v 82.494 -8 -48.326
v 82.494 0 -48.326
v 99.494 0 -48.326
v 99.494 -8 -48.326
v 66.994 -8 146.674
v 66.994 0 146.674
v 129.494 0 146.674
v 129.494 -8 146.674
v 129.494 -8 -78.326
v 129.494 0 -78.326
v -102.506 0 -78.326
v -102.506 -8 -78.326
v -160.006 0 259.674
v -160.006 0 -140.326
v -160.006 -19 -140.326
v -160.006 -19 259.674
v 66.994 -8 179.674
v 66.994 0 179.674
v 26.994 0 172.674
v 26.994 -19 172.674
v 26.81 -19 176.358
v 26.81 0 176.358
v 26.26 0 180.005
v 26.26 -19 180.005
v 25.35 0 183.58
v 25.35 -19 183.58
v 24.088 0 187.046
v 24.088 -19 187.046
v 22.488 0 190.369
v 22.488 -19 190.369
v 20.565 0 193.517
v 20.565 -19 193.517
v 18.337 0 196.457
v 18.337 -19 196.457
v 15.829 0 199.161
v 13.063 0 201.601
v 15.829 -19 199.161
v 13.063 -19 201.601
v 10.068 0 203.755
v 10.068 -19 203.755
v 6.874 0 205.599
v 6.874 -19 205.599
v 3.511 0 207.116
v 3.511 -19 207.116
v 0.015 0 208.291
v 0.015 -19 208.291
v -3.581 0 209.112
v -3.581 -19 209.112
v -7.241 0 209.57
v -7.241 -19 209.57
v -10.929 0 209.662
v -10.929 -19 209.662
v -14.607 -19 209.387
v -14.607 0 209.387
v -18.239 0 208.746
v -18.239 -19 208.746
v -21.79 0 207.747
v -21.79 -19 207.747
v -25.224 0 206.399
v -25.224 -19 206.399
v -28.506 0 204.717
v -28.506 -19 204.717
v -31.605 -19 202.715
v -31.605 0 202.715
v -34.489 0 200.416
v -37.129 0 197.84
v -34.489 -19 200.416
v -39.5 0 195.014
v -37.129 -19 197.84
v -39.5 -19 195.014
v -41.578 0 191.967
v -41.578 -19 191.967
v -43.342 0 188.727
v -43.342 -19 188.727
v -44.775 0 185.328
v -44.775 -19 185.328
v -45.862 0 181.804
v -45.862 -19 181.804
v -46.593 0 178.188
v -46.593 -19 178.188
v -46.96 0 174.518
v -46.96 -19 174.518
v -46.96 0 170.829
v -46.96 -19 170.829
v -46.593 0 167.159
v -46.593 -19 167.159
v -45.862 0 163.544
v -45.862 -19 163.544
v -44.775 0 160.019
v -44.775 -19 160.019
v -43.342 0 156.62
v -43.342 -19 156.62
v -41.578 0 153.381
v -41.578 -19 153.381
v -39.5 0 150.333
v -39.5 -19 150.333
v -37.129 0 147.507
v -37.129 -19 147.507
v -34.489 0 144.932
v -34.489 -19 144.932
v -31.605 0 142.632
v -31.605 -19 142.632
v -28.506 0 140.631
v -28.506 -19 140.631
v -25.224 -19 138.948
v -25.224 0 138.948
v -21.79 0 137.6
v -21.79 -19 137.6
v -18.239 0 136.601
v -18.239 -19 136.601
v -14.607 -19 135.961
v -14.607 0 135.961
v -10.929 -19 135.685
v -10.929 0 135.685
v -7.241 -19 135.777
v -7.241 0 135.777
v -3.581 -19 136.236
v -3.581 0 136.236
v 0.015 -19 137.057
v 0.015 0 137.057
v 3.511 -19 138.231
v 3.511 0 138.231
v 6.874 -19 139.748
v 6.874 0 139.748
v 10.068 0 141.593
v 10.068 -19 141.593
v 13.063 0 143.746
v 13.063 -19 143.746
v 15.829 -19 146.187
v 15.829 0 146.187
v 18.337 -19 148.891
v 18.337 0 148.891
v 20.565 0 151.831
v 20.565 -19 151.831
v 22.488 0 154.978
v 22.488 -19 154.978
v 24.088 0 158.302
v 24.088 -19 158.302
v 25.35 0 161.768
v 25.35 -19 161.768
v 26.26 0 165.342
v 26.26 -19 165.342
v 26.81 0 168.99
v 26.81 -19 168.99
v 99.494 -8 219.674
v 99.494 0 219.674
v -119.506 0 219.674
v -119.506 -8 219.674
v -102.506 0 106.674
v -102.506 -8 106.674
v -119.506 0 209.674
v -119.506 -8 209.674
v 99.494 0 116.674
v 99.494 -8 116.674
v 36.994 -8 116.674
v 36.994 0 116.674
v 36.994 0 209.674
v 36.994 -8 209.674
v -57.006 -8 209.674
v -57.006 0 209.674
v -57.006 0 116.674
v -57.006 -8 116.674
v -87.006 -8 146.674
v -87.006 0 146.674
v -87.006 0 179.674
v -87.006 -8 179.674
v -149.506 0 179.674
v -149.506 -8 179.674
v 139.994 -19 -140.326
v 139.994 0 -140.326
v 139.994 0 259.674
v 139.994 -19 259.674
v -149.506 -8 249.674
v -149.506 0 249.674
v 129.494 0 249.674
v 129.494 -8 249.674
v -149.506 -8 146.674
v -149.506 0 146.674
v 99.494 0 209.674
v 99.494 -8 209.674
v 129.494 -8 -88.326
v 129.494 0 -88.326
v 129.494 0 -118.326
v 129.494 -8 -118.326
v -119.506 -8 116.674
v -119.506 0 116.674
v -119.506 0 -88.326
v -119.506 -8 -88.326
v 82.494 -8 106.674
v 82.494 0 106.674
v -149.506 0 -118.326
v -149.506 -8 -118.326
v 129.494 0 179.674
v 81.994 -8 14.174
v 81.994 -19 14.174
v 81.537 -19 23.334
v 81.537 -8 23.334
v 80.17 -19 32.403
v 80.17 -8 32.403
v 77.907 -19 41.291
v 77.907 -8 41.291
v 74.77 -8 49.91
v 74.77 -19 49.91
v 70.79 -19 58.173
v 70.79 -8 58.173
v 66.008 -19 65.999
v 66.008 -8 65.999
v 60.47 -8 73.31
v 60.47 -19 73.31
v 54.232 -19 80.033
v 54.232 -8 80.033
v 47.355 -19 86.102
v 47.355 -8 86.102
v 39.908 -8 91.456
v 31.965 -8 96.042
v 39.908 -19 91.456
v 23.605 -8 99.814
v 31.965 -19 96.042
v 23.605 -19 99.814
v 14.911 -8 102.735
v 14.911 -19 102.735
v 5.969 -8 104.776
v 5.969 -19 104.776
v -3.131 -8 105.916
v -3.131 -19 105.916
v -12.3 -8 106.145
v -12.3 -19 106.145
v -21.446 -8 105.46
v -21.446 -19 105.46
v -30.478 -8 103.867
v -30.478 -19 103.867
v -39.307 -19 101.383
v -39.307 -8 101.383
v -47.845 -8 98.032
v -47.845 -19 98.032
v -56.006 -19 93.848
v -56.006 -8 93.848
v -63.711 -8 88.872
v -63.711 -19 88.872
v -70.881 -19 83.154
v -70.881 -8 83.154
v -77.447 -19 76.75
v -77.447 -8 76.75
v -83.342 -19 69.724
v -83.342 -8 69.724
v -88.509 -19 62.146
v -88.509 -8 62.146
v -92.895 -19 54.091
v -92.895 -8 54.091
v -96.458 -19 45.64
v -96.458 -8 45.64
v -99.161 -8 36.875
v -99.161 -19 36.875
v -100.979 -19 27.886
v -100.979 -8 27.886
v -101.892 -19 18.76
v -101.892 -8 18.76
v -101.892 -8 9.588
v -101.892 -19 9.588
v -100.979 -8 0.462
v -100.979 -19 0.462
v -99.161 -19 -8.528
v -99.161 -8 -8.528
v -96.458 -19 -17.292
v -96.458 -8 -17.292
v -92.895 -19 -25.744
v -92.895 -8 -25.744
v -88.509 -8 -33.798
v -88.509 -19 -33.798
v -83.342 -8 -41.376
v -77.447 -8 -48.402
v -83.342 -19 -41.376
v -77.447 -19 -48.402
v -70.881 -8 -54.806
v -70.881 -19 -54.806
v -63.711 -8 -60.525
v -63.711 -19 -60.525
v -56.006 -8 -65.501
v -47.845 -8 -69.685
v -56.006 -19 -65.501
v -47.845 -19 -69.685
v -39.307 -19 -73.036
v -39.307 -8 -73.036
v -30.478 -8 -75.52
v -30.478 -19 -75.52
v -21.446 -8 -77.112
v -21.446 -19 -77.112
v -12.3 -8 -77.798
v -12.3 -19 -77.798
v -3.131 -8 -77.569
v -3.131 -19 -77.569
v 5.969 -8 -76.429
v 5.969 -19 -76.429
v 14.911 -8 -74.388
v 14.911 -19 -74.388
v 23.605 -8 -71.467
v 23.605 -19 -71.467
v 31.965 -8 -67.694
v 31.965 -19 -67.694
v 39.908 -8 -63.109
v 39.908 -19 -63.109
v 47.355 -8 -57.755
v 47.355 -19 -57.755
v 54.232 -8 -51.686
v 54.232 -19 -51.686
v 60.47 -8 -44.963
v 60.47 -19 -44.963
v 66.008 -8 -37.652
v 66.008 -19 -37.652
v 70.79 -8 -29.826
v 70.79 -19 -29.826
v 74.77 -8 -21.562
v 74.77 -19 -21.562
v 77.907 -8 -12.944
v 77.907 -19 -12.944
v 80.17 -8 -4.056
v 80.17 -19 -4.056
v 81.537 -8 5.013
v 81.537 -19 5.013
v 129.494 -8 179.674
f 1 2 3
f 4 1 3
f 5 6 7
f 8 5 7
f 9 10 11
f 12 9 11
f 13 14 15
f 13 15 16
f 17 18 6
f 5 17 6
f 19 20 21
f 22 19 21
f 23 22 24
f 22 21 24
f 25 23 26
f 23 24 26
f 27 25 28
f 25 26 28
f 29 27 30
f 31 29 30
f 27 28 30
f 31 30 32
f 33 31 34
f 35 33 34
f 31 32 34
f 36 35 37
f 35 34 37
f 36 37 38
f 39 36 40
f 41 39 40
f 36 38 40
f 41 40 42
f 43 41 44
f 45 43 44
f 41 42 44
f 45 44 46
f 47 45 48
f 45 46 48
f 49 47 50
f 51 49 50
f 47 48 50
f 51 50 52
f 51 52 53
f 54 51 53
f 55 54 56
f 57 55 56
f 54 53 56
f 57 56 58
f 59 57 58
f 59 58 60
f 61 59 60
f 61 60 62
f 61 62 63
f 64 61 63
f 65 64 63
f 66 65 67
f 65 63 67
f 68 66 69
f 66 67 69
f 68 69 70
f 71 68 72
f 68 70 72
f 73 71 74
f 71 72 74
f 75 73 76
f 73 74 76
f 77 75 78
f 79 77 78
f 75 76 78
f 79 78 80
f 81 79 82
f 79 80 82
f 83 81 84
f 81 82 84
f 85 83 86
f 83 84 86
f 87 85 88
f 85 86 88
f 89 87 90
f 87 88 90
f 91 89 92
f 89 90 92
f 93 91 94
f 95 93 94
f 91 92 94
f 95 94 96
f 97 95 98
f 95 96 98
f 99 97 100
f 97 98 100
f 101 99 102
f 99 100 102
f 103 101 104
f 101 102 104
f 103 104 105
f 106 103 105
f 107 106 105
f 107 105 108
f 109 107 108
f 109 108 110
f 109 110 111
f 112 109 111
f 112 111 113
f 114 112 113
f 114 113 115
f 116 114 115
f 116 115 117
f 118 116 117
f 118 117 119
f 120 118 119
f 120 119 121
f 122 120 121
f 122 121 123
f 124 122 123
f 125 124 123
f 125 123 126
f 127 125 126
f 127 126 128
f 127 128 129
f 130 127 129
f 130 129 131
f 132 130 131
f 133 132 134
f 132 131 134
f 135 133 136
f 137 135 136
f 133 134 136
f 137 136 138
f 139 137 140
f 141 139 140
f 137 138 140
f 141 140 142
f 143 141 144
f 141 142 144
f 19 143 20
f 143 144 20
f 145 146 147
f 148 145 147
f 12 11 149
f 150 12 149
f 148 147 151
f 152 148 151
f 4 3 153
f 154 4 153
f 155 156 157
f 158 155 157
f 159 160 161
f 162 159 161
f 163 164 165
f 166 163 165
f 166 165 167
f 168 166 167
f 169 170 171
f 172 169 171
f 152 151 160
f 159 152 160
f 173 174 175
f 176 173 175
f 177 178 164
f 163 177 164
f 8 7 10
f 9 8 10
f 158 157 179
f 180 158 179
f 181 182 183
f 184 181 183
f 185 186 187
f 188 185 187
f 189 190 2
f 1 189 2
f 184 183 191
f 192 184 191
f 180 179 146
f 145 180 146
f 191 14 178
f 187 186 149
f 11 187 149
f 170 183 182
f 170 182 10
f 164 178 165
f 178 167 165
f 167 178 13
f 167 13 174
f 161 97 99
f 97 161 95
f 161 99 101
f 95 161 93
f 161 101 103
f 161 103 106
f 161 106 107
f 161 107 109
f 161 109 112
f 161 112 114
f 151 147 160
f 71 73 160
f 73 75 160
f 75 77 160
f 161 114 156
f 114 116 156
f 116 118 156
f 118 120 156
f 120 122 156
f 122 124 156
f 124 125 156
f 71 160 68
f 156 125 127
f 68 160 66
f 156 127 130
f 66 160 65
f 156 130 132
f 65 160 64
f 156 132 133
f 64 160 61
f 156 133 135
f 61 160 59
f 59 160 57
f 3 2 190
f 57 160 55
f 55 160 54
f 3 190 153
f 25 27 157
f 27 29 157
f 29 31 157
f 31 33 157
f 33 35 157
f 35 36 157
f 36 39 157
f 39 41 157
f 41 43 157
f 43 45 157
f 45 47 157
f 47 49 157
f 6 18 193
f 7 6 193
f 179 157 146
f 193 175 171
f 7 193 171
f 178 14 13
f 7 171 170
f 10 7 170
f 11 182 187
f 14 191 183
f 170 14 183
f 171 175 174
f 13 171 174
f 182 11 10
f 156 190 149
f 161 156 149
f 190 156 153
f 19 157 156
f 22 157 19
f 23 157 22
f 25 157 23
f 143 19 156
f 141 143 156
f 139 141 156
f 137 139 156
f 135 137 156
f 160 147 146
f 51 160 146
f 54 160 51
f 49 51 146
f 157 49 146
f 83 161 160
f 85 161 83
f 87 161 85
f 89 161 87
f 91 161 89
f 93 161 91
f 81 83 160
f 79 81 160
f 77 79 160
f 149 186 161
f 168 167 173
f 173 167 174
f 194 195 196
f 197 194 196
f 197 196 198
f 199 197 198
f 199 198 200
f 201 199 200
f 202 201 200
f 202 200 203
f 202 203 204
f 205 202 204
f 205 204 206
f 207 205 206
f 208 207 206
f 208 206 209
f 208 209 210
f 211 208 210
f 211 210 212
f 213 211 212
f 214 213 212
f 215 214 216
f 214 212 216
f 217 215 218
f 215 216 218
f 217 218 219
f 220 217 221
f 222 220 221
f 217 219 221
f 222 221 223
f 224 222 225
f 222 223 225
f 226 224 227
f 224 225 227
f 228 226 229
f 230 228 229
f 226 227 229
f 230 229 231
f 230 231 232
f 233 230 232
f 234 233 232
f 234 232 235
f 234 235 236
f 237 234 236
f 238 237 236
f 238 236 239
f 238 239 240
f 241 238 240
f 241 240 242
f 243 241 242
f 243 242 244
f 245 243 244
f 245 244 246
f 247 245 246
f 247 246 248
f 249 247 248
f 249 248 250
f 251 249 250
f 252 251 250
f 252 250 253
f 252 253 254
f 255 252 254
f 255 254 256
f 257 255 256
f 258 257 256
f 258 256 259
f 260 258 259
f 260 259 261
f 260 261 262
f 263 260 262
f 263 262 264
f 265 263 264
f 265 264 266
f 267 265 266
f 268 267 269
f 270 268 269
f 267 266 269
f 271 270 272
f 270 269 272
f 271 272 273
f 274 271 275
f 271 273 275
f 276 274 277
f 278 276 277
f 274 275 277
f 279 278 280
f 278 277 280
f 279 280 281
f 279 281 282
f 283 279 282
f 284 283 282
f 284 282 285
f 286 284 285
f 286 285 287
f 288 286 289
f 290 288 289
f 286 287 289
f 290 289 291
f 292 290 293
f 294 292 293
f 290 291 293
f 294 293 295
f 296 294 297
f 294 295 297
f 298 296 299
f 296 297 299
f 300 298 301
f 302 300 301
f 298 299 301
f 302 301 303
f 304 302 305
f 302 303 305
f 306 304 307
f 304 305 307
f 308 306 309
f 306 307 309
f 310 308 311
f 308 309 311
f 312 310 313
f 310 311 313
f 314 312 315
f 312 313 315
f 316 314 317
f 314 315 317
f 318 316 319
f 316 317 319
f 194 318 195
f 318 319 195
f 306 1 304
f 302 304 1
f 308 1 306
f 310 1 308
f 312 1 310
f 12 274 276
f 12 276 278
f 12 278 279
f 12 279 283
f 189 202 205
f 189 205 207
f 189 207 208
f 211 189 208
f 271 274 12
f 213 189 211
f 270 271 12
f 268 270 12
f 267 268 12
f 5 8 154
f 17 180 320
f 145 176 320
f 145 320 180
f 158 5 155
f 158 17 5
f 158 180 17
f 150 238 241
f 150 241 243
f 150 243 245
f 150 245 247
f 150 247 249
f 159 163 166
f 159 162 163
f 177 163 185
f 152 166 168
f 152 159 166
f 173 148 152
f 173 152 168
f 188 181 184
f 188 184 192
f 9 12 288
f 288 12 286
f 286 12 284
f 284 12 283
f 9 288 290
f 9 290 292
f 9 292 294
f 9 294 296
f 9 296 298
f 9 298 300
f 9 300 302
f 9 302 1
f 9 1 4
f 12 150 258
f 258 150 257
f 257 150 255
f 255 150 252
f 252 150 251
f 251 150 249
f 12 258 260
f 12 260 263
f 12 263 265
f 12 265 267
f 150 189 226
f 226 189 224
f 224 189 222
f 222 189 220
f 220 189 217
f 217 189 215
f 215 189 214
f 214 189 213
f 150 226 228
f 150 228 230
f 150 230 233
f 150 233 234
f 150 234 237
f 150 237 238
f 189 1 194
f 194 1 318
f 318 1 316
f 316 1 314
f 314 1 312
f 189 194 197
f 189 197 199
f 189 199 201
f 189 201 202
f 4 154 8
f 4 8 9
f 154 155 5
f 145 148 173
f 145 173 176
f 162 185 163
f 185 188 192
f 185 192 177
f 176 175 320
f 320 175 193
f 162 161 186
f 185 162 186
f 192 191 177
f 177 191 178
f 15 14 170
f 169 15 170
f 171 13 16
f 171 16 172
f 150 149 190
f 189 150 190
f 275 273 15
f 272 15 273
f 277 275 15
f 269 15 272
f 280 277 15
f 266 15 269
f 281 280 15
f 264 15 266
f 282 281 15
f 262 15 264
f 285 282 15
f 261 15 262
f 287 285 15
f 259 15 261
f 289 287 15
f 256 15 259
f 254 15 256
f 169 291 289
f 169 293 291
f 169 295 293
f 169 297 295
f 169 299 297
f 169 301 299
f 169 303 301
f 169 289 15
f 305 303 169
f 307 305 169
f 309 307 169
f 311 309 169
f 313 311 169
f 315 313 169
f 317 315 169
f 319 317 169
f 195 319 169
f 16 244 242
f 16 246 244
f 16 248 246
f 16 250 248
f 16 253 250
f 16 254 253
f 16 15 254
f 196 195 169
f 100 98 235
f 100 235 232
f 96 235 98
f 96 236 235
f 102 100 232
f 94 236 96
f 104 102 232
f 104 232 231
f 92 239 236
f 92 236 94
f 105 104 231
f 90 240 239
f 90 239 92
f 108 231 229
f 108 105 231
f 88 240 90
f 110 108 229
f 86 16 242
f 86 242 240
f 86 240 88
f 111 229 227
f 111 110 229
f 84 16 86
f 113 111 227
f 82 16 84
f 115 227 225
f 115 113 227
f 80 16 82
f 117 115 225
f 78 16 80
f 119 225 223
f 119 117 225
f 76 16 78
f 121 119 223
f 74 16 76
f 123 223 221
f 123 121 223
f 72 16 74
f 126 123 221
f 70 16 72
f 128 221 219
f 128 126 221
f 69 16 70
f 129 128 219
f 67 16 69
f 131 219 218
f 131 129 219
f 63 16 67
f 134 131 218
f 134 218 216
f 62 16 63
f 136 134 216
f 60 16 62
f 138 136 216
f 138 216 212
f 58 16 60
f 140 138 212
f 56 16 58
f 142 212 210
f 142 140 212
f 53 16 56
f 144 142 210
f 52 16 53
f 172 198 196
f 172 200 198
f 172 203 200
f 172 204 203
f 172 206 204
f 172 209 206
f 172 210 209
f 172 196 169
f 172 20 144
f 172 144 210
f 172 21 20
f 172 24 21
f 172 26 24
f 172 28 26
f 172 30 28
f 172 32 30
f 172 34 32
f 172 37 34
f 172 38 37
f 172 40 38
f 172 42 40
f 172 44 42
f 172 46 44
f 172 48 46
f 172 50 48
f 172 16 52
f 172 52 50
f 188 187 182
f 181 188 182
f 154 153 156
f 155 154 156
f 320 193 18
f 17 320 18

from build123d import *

# Parameters (mm, degrees)
F0_W     = 300
F0_H     = 400
F1_DEPTH = 19
F2_R     = 37
F2_R_2   = 92
F3_DEPTH = 19
F5_DEPTH = 8


with BuildPart() as f1:
    # F0 (on Front) → F1 (new body)
    with BuildSketch(Plane.XZ):
        with Locations((-10.006191, 59.673727)):
            Rectangle(F0_W, F0_H)
    extrude(amount=F1_DEPTH)

    # F2 (on face) → F3 (cut)
    with BuildSketch(Plane.XZ.offset(19)):
        with Locations((-10.006191, 172.673727)):
            Circle(F2_R)
        with Locations((-10.006191, 14.173727)):
            Circle(F2_R_2)
    extrude(amount=-F3_DEPTH, mode=Mode.SUBTRACT)

    # F4 (on face) → F5 (cut)
    with BuildSketch(Plane(origin=(0, 0, 0), x_dir=(-1, 0, 0), z_dir=(0, 1, 0))):
        Polygon((119.506191, -88.326273), (-129.493809, -88.326273), (-129.493809, -118.326273), (149.506191, -118.326273), (149.506191, 146.673727), (87.006191, 146.673727), (87.006191, 179.673727), (149.506191, 179.673727), (149.506191, 249.673727), (-129.493809, 249.673727), (-129.493809, 179.673727), (-66.993809, 179.673727), (-66.993809, 146.673727), (-129.493809, 146.673727), (-129.493809, -78.326273), (102.506191, -78.326273), (102.506191, 106.673727), (-82.493809, 106.673727), (-82.493809, -48.326273), (-99.493809, -48.326273), (-99.493809, 116.673727), (-36.993809, 116.673727), (-36.993809, 209.673727), (-99.493809, 209.673727), (-99.493809, 219.673727), (119.506191, 219.673727), (119.506191, 209.673727), (57.006191, 209.673727), (57.006191, 116.673727), (119.506191, 116.673727), align=None)
    extrude(amount=-F5_DEPTH, mode=Mode.SUBTRACT)


solid = f1.part
